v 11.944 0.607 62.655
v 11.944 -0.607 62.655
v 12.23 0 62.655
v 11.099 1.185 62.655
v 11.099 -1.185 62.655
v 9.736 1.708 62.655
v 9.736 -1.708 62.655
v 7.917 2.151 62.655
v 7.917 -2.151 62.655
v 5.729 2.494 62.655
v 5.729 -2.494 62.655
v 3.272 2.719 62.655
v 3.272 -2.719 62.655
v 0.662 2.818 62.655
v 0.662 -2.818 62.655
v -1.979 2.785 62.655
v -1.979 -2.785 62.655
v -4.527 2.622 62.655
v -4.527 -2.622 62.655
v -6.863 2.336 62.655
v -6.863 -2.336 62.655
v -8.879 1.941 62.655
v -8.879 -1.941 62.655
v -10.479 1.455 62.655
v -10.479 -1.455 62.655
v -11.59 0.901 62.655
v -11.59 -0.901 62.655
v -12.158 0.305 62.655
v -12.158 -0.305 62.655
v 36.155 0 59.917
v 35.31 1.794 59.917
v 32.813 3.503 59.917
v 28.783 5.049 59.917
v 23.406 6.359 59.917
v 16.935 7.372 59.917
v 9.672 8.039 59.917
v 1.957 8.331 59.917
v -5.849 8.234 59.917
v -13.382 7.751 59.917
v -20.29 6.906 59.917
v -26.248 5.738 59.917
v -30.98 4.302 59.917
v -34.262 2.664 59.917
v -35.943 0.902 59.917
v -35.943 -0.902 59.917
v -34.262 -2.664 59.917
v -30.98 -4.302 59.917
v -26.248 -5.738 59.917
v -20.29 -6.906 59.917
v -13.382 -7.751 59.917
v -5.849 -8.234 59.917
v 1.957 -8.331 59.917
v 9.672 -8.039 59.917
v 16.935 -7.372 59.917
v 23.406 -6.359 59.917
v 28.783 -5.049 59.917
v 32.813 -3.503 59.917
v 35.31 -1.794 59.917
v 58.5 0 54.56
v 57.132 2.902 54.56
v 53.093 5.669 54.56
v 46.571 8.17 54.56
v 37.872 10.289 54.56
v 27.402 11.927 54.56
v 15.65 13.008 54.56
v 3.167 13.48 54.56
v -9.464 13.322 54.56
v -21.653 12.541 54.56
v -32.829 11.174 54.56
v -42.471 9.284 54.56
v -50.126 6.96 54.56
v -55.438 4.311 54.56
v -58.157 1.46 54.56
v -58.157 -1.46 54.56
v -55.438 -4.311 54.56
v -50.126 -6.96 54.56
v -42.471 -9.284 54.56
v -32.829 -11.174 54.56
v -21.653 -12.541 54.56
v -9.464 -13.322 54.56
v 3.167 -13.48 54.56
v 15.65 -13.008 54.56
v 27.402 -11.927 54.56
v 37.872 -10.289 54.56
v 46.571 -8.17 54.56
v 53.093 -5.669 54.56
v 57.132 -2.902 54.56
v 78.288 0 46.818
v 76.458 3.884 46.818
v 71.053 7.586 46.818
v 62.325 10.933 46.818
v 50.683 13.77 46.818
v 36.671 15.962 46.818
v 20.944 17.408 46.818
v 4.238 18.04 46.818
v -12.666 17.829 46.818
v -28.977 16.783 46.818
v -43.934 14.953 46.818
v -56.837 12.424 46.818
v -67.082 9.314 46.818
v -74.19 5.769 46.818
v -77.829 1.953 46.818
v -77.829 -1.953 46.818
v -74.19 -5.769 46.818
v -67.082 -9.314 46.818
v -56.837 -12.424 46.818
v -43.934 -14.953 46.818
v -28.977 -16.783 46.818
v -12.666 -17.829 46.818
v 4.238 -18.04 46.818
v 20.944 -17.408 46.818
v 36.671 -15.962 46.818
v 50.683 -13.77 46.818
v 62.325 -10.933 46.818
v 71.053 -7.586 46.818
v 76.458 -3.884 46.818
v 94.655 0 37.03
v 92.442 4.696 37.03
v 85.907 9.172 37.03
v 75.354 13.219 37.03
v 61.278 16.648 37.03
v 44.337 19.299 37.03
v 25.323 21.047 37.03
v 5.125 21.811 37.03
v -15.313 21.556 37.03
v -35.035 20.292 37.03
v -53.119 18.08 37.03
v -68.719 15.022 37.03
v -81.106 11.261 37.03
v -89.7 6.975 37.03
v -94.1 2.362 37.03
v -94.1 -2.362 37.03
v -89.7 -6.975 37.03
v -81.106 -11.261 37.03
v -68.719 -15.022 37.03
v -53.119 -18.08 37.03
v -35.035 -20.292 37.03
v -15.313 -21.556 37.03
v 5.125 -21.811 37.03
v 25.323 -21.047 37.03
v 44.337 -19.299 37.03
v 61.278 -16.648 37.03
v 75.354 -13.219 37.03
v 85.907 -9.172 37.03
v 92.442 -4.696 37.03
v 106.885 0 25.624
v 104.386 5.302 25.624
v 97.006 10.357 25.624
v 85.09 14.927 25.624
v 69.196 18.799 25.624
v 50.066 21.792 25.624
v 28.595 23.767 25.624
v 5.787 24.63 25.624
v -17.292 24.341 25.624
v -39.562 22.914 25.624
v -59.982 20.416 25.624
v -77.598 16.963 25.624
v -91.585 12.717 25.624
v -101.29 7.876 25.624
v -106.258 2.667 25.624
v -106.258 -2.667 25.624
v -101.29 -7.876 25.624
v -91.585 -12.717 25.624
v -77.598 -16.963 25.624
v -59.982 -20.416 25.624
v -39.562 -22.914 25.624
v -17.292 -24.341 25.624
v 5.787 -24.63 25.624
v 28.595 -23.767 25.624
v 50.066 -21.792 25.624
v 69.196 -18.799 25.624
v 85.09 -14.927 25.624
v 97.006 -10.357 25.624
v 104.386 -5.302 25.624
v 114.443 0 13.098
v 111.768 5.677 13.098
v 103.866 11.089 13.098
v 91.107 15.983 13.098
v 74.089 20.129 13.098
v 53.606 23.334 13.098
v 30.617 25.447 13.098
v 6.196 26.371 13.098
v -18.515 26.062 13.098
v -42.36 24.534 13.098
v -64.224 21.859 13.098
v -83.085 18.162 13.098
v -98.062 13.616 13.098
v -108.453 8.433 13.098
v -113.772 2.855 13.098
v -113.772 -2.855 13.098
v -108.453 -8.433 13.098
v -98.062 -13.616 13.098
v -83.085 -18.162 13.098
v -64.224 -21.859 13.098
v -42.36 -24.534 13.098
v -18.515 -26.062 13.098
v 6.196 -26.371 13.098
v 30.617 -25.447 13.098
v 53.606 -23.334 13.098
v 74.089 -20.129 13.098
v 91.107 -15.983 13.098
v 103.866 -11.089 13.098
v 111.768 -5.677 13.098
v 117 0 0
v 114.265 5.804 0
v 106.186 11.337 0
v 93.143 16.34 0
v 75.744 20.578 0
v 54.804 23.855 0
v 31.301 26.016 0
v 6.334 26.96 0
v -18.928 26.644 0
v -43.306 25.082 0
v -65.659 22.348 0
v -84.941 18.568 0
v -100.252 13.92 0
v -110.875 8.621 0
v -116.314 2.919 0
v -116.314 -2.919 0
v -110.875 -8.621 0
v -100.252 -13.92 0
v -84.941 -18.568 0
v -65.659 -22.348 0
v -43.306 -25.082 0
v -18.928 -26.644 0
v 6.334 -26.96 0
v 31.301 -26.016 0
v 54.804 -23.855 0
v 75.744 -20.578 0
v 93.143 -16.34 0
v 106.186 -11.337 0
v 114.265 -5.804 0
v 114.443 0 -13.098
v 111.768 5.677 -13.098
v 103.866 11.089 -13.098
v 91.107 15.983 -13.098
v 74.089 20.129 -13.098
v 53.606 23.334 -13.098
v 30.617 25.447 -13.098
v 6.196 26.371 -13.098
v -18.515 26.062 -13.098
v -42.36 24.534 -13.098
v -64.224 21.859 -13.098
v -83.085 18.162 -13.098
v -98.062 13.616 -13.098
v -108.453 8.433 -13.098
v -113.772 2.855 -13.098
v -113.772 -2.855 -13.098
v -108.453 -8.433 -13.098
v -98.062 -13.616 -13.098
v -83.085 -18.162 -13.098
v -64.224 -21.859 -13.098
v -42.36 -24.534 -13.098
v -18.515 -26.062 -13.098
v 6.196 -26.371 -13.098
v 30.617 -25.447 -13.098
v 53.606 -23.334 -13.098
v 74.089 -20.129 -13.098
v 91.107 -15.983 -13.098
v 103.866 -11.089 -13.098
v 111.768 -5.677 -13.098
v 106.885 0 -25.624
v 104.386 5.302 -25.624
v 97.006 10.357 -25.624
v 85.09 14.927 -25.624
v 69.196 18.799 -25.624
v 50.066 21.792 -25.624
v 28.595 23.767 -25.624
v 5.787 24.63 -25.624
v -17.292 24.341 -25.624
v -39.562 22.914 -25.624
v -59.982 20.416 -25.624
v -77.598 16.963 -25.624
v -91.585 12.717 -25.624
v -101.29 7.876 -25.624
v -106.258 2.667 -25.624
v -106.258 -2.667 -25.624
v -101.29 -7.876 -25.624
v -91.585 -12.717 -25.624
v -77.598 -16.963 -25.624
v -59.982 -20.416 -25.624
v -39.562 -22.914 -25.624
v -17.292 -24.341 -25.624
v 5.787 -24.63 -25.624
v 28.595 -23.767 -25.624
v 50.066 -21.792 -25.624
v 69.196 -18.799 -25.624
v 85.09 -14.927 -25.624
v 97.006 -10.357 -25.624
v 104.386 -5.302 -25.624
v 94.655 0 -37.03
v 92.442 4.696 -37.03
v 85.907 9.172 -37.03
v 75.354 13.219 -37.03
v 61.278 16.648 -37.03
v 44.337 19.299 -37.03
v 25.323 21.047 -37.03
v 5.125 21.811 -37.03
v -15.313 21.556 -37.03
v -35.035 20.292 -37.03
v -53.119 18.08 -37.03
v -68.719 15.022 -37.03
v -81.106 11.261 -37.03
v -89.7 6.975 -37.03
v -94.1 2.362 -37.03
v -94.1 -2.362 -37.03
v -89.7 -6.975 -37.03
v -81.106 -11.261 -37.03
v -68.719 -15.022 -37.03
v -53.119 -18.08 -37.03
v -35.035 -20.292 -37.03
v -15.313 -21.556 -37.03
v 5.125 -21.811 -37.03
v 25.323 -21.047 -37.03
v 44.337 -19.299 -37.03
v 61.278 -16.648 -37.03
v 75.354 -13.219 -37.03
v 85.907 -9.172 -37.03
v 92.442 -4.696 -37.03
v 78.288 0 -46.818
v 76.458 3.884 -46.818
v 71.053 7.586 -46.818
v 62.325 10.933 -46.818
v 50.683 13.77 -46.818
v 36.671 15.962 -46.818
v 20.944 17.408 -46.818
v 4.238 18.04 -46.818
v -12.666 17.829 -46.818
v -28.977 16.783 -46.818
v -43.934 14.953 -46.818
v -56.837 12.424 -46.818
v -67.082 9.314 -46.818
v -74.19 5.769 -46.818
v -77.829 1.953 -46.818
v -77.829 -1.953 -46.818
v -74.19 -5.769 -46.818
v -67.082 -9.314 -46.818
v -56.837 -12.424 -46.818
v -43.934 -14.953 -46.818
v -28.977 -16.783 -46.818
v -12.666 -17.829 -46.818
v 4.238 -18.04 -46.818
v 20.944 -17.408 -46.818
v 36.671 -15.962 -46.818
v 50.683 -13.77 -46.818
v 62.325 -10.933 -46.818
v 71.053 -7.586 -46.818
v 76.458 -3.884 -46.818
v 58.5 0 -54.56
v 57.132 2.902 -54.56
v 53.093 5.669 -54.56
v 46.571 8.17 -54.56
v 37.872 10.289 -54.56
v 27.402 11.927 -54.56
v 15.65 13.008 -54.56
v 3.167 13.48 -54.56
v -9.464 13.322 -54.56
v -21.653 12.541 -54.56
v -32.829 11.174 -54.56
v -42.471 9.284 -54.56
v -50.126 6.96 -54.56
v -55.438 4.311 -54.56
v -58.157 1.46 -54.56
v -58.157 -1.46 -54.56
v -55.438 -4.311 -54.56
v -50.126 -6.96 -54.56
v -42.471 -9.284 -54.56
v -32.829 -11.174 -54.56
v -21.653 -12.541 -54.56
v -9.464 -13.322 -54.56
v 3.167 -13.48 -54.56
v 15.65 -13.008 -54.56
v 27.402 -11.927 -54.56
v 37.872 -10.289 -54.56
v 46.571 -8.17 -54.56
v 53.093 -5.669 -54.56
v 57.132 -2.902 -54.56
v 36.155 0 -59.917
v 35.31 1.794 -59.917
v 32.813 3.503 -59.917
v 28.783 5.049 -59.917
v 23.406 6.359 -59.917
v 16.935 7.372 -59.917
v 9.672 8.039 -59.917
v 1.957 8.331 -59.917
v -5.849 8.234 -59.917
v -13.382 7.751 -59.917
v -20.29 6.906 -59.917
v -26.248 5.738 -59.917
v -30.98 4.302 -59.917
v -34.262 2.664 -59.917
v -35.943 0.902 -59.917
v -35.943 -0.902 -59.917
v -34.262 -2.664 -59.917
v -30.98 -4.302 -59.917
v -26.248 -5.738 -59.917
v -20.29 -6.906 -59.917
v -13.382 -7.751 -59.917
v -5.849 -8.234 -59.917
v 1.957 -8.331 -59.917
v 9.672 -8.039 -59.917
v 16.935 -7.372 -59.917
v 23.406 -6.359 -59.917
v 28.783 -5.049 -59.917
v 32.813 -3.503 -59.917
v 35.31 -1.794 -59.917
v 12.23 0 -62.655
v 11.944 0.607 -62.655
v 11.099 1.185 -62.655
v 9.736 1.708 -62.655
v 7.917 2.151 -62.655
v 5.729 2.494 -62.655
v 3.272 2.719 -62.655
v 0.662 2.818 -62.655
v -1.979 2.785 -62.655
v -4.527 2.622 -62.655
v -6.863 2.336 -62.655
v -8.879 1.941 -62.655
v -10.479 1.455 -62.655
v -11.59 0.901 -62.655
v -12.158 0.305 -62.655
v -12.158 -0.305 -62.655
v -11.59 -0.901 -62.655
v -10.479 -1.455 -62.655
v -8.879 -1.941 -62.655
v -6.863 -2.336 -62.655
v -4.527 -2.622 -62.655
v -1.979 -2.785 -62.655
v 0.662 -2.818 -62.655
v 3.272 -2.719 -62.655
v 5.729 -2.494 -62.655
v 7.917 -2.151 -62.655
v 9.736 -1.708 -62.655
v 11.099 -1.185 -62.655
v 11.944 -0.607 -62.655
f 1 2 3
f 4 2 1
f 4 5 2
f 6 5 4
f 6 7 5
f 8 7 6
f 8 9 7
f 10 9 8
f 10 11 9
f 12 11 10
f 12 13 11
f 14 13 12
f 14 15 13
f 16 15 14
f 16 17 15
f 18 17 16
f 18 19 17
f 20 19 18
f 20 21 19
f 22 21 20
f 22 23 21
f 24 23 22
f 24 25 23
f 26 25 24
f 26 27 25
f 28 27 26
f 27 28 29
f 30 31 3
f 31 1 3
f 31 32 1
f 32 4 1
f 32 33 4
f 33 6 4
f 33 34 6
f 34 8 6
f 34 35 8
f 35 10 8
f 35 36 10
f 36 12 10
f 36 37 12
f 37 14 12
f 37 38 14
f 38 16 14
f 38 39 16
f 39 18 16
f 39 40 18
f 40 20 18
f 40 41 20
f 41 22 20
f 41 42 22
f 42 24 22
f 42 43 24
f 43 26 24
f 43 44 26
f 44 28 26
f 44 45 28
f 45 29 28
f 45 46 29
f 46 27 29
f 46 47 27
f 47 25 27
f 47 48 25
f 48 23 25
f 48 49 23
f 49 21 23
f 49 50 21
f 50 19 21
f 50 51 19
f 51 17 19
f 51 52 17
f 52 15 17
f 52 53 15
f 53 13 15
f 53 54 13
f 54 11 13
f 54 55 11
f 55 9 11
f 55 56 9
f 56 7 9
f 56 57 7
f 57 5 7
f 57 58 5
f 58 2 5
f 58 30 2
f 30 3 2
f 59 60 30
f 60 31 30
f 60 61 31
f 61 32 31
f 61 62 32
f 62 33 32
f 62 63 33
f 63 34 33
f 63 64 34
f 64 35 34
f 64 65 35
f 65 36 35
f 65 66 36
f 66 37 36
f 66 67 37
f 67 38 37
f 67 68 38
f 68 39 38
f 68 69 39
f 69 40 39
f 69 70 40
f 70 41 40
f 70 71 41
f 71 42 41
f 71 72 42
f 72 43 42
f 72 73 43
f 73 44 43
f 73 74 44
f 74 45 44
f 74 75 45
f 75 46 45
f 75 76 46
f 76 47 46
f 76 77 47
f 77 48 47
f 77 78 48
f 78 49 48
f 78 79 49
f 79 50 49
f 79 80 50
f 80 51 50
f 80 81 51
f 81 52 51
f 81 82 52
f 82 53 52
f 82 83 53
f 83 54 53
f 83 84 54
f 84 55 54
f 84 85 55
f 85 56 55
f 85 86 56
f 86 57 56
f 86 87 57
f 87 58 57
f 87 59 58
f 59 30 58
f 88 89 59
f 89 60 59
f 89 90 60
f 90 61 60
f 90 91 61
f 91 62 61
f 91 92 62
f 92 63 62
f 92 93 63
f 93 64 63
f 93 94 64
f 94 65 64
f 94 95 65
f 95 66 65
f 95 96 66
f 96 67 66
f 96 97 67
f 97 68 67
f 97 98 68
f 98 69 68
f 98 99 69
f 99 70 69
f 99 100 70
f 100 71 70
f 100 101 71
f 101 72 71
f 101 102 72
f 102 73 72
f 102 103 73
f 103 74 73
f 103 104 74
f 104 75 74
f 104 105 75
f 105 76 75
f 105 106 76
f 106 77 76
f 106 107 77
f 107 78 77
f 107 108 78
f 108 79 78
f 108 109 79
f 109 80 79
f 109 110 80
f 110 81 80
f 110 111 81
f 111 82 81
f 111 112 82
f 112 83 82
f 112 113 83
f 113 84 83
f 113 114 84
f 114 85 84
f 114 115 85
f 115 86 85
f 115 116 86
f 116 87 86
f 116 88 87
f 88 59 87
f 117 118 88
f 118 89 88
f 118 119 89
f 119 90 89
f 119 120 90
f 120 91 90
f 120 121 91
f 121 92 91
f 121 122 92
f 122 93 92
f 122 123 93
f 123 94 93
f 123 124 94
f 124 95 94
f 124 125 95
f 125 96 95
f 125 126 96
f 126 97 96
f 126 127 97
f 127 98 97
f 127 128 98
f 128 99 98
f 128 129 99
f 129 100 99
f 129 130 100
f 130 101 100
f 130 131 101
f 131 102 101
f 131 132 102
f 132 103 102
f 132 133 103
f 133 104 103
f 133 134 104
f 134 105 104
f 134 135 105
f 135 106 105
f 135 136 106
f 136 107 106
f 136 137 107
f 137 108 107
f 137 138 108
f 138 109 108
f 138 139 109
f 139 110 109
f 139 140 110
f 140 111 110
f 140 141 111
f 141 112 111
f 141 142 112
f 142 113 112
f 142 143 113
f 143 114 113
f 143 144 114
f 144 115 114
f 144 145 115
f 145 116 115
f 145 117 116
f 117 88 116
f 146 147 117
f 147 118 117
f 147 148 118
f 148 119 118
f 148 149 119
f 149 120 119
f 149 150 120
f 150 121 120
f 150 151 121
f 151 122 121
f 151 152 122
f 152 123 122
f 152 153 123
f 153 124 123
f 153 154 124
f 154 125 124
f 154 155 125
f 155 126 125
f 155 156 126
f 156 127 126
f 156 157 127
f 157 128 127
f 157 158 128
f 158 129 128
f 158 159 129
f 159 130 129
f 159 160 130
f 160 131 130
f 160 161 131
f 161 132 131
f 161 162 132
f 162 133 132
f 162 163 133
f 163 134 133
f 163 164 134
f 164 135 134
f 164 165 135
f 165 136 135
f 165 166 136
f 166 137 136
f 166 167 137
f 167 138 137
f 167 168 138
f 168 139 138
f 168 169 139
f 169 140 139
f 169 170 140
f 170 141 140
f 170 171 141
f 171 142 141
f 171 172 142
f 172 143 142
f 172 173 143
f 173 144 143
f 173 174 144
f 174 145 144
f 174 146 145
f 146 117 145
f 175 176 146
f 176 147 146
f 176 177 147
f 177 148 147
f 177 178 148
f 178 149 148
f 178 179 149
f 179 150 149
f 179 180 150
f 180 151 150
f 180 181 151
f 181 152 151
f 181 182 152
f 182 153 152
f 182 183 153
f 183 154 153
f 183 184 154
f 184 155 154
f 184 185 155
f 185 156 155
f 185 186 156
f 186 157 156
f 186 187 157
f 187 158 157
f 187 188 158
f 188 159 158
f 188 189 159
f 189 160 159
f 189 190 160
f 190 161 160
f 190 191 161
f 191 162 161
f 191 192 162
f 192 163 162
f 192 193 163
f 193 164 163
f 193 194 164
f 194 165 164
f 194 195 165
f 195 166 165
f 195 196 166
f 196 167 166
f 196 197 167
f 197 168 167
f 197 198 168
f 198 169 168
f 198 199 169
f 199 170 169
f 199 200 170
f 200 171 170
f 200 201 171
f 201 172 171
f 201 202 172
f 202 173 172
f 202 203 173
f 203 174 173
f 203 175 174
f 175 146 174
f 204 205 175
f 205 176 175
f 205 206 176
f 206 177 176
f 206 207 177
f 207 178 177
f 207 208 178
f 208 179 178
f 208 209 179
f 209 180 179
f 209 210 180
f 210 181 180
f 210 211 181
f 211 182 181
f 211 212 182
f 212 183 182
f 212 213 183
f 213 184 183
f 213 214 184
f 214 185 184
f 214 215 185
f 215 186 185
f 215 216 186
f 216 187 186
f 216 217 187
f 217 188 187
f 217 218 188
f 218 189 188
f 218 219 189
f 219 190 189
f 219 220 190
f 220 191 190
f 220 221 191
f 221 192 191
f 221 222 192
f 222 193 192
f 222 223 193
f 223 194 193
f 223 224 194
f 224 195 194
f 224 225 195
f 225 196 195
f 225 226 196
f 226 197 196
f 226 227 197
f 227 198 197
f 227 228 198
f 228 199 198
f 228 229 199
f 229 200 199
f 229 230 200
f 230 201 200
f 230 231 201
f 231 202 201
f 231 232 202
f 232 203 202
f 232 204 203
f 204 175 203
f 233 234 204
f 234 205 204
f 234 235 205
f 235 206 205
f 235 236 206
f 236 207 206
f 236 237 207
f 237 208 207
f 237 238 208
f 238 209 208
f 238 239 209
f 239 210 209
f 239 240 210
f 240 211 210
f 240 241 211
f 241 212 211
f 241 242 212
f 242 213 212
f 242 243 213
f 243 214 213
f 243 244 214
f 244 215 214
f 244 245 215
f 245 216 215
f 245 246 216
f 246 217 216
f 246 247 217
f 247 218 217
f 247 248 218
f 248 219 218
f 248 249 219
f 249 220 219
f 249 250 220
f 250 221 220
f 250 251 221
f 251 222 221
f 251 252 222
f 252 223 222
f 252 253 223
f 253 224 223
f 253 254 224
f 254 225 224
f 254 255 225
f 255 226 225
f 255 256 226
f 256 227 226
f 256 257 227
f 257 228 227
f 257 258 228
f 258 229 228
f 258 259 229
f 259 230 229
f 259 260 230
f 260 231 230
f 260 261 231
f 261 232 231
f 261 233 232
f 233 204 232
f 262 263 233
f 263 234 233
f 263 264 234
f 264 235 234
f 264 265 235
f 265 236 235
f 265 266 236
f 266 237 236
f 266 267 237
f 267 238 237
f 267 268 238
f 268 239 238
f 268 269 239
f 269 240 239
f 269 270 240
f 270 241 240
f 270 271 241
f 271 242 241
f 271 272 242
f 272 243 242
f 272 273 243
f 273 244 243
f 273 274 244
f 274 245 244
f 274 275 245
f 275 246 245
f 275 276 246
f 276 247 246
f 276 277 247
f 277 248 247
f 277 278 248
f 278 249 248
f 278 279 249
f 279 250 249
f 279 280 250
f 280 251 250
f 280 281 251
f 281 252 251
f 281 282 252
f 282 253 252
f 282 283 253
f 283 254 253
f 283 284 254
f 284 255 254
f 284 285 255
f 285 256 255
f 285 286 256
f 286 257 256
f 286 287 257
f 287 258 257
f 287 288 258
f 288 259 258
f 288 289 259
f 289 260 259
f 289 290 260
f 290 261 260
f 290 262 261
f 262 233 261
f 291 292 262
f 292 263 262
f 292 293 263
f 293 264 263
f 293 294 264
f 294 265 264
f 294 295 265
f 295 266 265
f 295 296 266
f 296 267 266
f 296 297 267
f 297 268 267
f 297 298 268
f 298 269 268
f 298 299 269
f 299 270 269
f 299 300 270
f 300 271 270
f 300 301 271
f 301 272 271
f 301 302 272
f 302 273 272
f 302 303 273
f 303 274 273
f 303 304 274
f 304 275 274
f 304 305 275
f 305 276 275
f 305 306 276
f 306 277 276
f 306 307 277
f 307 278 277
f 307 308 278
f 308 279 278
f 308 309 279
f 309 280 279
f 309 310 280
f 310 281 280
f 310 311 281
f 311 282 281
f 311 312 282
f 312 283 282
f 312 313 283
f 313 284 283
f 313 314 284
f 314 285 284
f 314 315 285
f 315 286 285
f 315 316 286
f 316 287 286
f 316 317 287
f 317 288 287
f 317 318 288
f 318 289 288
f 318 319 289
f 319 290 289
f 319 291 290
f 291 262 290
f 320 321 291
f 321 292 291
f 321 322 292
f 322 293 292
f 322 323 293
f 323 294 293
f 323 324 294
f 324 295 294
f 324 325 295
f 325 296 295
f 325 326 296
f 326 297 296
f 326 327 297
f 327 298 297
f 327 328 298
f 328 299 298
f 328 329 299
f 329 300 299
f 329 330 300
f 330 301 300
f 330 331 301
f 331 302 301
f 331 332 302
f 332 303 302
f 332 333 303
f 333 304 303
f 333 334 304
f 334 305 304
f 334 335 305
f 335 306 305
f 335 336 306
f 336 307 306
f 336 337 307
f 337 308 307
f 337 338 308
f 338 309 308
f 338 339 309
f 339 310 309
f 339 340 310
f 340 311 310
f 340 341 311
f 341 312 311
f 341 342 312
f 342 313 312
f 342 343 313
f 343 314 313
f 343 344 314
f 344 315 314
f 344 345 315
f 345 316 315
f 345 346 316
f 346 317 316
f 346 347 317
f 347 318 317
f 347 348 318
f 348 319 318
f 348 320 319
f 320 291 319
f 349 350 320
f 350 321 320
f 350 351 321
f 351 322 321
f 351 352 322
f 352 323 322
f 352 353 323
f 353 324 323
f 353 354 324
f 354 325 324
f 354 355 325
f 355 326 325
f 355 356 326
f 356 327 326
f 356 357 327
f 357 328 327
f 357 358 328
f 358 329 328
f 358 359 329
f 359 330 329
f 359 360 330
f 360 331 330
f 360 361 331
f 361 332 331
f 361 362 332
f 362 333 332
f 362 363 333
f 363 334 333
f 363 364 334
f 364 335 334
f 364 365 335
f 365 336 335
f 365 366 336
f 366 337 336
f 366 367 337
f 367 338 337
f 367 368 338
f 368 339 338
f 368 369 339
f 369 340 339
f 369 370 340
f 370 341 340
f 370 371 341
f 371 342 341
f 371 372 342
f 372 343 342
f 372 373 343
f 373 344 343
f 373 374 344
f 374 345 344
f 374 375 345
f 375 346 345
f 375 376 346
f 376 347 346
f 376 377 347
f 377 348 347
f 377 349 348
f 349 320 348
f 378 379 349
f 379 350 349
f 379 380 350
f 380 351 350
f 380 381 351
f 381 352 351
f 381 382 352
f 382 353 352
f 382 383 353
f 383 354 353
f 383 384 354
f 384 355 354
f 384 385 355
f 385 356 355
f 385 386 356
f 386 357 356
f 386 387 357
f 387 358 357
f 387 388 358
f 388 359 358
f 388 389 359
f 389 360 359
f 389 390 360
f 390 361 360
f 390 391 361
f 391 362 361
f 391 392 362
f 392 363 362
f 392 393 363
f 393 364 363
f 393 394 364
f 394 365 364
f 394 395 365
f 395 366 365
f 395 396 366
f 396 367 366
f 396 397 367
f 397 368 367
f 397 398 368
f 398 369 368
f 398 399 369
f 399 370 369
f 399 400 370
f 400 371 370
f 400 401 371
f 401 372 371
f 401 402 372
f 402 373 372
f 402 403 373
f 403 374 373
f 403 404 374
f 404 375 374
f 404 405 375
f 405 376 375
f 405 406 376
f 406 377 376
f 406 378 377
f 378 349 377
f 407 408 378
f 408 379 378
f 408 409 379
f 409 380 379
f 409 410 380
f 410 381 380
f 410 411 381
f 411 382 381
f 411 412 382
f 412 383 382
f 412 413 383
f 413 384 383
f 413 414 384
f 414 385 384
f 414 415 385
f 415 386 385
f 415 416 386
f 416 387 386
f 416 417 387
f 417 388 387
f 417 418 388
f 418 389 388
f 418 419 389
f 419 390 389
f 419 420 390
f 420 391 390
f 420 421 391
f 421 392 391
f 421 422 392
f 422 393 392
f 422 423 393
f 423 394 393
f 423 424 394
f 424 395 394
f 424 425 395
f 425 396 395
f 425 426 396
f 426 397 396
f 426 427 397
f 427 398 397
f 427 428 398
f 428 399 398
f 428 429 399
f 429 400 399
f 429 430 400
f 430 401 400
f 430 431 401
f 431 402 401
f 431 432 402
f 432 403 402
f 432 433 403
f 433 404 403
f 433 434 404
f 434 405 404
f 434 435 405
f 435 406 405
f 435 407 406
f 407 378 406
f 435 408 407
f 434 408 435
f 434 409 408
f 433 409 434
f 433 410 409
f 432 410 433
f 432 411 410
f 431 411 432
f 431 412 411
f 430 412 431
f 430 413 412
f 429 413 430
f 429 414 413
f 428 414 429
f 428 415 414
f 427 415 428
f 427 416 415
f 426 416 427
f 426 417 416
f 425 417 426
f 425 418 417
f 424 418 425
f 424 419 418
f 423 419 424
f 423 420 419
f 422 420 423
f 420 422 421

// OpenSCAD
// Generated by SolidPython 1.0.1 on 2020-07-29 00:46:50


scale(v = [13, 3, 7]) {
	sphere(r = 9);
}
/***********************************************
*********      SolidPython code:      **********
************************************************
 
# import packages: SolidPython
from solid import *
from solid.utils import *
from itertools import chain, combinations, permutations


class Resize:

    def __init__(self, scad_file):
        self.scad_file = scad_file
        #self.scad_file = import_scad(scad_file)
        # cone/cylinder param:
        self.r1 = 0
        self.r2 = 0
        self.h = 0
        # rectangular prism param:
        self.w = 0
        self.l = 0
        # ellipse param:
        self.r = 0

    # import OpenScad code (file name corresponds to shape)


    # classify shape + parameters
    def assign(self, param1, param2, param3):
        if self.scad_file == 'cone.scad':
            self.r1 = param1
            self.r2 = param2
            self.h = param3
        elif self.scad_file == 'cylinder.scad':
            self.r1 = param1
            self.r2 = param2
            self.h = param3
        elif self.scad_file == 'rectangularPrism.scad':
            self.h = param1
            self.l = param2
            self.w = param3
        else:
            self.r = param1
            self.h = param2

    # resize parameters
    def iterate(self):
        x = range(3, 20, 2)
        i = 1
        if self.scad_file == 'cone.scad':
            tempList = list(permutations(x, 2))
            for temp in tempList:
                param1 = temp[0]
                param2 = temp[1]
                filepath = 'produced_scad_files/' + 'cone' + str(param1) + '_' + str(param2) + '_' + '.scad'
                scad_render_to_file(cylinder(h=param1, r1=param2, r2=0), filepath)

        elif self.scad_file == 'cylinder.scad':
            tempList = list(permutations(x, 3))
            for temp in tempList:
                param1 = temp[0]
                param2 = temp[1]
                filepath = 'produced_scad_files/' + 'cylinder' + str(param1) + '_' + str(param2) + '_' + '.scad'
                scad_render_to_file(cylinder(h=param1, r1=param2, r2=param2), filepath)

        elif self.scad_file == 'rectangularPrism.scad':
            tempList = list(permutations(x, 3))
            for temp in tempList:
                param1 = temp[0]
                param2 = temp[1]
                param3 = temp[2]
                filepath = 'produced_scad_files/' + 'rectangularPrism' + str(param1) + '_' + str(param2) + '_' + str(
                    param3) + '.scad'
                scad_render_to_file(cube(size=(param1, param2, param3)), filepath)

        elif self.scad_file == 'ellipse.scad':
            tempList = list(permutations(x, 4))
            for temp in tempList:
                param1 = temp[0]
                param2 = temp[1]
                param3 = temp[2]
                param4 = temp[3]
                filepath = 'produced_scad_files/' + 'ellipse' + str(param1) + '_' + str(param2) + '_' + str(param3) + '_' + str(param4) + '.scad'
                scad_render_to_file(scale([param1, param2, param3])(sphere(r=param4)), filepath)

    def render_to_scadfile(self):
        scad_render_to_file(scad, 'example.scad') 
 
************************************************/
